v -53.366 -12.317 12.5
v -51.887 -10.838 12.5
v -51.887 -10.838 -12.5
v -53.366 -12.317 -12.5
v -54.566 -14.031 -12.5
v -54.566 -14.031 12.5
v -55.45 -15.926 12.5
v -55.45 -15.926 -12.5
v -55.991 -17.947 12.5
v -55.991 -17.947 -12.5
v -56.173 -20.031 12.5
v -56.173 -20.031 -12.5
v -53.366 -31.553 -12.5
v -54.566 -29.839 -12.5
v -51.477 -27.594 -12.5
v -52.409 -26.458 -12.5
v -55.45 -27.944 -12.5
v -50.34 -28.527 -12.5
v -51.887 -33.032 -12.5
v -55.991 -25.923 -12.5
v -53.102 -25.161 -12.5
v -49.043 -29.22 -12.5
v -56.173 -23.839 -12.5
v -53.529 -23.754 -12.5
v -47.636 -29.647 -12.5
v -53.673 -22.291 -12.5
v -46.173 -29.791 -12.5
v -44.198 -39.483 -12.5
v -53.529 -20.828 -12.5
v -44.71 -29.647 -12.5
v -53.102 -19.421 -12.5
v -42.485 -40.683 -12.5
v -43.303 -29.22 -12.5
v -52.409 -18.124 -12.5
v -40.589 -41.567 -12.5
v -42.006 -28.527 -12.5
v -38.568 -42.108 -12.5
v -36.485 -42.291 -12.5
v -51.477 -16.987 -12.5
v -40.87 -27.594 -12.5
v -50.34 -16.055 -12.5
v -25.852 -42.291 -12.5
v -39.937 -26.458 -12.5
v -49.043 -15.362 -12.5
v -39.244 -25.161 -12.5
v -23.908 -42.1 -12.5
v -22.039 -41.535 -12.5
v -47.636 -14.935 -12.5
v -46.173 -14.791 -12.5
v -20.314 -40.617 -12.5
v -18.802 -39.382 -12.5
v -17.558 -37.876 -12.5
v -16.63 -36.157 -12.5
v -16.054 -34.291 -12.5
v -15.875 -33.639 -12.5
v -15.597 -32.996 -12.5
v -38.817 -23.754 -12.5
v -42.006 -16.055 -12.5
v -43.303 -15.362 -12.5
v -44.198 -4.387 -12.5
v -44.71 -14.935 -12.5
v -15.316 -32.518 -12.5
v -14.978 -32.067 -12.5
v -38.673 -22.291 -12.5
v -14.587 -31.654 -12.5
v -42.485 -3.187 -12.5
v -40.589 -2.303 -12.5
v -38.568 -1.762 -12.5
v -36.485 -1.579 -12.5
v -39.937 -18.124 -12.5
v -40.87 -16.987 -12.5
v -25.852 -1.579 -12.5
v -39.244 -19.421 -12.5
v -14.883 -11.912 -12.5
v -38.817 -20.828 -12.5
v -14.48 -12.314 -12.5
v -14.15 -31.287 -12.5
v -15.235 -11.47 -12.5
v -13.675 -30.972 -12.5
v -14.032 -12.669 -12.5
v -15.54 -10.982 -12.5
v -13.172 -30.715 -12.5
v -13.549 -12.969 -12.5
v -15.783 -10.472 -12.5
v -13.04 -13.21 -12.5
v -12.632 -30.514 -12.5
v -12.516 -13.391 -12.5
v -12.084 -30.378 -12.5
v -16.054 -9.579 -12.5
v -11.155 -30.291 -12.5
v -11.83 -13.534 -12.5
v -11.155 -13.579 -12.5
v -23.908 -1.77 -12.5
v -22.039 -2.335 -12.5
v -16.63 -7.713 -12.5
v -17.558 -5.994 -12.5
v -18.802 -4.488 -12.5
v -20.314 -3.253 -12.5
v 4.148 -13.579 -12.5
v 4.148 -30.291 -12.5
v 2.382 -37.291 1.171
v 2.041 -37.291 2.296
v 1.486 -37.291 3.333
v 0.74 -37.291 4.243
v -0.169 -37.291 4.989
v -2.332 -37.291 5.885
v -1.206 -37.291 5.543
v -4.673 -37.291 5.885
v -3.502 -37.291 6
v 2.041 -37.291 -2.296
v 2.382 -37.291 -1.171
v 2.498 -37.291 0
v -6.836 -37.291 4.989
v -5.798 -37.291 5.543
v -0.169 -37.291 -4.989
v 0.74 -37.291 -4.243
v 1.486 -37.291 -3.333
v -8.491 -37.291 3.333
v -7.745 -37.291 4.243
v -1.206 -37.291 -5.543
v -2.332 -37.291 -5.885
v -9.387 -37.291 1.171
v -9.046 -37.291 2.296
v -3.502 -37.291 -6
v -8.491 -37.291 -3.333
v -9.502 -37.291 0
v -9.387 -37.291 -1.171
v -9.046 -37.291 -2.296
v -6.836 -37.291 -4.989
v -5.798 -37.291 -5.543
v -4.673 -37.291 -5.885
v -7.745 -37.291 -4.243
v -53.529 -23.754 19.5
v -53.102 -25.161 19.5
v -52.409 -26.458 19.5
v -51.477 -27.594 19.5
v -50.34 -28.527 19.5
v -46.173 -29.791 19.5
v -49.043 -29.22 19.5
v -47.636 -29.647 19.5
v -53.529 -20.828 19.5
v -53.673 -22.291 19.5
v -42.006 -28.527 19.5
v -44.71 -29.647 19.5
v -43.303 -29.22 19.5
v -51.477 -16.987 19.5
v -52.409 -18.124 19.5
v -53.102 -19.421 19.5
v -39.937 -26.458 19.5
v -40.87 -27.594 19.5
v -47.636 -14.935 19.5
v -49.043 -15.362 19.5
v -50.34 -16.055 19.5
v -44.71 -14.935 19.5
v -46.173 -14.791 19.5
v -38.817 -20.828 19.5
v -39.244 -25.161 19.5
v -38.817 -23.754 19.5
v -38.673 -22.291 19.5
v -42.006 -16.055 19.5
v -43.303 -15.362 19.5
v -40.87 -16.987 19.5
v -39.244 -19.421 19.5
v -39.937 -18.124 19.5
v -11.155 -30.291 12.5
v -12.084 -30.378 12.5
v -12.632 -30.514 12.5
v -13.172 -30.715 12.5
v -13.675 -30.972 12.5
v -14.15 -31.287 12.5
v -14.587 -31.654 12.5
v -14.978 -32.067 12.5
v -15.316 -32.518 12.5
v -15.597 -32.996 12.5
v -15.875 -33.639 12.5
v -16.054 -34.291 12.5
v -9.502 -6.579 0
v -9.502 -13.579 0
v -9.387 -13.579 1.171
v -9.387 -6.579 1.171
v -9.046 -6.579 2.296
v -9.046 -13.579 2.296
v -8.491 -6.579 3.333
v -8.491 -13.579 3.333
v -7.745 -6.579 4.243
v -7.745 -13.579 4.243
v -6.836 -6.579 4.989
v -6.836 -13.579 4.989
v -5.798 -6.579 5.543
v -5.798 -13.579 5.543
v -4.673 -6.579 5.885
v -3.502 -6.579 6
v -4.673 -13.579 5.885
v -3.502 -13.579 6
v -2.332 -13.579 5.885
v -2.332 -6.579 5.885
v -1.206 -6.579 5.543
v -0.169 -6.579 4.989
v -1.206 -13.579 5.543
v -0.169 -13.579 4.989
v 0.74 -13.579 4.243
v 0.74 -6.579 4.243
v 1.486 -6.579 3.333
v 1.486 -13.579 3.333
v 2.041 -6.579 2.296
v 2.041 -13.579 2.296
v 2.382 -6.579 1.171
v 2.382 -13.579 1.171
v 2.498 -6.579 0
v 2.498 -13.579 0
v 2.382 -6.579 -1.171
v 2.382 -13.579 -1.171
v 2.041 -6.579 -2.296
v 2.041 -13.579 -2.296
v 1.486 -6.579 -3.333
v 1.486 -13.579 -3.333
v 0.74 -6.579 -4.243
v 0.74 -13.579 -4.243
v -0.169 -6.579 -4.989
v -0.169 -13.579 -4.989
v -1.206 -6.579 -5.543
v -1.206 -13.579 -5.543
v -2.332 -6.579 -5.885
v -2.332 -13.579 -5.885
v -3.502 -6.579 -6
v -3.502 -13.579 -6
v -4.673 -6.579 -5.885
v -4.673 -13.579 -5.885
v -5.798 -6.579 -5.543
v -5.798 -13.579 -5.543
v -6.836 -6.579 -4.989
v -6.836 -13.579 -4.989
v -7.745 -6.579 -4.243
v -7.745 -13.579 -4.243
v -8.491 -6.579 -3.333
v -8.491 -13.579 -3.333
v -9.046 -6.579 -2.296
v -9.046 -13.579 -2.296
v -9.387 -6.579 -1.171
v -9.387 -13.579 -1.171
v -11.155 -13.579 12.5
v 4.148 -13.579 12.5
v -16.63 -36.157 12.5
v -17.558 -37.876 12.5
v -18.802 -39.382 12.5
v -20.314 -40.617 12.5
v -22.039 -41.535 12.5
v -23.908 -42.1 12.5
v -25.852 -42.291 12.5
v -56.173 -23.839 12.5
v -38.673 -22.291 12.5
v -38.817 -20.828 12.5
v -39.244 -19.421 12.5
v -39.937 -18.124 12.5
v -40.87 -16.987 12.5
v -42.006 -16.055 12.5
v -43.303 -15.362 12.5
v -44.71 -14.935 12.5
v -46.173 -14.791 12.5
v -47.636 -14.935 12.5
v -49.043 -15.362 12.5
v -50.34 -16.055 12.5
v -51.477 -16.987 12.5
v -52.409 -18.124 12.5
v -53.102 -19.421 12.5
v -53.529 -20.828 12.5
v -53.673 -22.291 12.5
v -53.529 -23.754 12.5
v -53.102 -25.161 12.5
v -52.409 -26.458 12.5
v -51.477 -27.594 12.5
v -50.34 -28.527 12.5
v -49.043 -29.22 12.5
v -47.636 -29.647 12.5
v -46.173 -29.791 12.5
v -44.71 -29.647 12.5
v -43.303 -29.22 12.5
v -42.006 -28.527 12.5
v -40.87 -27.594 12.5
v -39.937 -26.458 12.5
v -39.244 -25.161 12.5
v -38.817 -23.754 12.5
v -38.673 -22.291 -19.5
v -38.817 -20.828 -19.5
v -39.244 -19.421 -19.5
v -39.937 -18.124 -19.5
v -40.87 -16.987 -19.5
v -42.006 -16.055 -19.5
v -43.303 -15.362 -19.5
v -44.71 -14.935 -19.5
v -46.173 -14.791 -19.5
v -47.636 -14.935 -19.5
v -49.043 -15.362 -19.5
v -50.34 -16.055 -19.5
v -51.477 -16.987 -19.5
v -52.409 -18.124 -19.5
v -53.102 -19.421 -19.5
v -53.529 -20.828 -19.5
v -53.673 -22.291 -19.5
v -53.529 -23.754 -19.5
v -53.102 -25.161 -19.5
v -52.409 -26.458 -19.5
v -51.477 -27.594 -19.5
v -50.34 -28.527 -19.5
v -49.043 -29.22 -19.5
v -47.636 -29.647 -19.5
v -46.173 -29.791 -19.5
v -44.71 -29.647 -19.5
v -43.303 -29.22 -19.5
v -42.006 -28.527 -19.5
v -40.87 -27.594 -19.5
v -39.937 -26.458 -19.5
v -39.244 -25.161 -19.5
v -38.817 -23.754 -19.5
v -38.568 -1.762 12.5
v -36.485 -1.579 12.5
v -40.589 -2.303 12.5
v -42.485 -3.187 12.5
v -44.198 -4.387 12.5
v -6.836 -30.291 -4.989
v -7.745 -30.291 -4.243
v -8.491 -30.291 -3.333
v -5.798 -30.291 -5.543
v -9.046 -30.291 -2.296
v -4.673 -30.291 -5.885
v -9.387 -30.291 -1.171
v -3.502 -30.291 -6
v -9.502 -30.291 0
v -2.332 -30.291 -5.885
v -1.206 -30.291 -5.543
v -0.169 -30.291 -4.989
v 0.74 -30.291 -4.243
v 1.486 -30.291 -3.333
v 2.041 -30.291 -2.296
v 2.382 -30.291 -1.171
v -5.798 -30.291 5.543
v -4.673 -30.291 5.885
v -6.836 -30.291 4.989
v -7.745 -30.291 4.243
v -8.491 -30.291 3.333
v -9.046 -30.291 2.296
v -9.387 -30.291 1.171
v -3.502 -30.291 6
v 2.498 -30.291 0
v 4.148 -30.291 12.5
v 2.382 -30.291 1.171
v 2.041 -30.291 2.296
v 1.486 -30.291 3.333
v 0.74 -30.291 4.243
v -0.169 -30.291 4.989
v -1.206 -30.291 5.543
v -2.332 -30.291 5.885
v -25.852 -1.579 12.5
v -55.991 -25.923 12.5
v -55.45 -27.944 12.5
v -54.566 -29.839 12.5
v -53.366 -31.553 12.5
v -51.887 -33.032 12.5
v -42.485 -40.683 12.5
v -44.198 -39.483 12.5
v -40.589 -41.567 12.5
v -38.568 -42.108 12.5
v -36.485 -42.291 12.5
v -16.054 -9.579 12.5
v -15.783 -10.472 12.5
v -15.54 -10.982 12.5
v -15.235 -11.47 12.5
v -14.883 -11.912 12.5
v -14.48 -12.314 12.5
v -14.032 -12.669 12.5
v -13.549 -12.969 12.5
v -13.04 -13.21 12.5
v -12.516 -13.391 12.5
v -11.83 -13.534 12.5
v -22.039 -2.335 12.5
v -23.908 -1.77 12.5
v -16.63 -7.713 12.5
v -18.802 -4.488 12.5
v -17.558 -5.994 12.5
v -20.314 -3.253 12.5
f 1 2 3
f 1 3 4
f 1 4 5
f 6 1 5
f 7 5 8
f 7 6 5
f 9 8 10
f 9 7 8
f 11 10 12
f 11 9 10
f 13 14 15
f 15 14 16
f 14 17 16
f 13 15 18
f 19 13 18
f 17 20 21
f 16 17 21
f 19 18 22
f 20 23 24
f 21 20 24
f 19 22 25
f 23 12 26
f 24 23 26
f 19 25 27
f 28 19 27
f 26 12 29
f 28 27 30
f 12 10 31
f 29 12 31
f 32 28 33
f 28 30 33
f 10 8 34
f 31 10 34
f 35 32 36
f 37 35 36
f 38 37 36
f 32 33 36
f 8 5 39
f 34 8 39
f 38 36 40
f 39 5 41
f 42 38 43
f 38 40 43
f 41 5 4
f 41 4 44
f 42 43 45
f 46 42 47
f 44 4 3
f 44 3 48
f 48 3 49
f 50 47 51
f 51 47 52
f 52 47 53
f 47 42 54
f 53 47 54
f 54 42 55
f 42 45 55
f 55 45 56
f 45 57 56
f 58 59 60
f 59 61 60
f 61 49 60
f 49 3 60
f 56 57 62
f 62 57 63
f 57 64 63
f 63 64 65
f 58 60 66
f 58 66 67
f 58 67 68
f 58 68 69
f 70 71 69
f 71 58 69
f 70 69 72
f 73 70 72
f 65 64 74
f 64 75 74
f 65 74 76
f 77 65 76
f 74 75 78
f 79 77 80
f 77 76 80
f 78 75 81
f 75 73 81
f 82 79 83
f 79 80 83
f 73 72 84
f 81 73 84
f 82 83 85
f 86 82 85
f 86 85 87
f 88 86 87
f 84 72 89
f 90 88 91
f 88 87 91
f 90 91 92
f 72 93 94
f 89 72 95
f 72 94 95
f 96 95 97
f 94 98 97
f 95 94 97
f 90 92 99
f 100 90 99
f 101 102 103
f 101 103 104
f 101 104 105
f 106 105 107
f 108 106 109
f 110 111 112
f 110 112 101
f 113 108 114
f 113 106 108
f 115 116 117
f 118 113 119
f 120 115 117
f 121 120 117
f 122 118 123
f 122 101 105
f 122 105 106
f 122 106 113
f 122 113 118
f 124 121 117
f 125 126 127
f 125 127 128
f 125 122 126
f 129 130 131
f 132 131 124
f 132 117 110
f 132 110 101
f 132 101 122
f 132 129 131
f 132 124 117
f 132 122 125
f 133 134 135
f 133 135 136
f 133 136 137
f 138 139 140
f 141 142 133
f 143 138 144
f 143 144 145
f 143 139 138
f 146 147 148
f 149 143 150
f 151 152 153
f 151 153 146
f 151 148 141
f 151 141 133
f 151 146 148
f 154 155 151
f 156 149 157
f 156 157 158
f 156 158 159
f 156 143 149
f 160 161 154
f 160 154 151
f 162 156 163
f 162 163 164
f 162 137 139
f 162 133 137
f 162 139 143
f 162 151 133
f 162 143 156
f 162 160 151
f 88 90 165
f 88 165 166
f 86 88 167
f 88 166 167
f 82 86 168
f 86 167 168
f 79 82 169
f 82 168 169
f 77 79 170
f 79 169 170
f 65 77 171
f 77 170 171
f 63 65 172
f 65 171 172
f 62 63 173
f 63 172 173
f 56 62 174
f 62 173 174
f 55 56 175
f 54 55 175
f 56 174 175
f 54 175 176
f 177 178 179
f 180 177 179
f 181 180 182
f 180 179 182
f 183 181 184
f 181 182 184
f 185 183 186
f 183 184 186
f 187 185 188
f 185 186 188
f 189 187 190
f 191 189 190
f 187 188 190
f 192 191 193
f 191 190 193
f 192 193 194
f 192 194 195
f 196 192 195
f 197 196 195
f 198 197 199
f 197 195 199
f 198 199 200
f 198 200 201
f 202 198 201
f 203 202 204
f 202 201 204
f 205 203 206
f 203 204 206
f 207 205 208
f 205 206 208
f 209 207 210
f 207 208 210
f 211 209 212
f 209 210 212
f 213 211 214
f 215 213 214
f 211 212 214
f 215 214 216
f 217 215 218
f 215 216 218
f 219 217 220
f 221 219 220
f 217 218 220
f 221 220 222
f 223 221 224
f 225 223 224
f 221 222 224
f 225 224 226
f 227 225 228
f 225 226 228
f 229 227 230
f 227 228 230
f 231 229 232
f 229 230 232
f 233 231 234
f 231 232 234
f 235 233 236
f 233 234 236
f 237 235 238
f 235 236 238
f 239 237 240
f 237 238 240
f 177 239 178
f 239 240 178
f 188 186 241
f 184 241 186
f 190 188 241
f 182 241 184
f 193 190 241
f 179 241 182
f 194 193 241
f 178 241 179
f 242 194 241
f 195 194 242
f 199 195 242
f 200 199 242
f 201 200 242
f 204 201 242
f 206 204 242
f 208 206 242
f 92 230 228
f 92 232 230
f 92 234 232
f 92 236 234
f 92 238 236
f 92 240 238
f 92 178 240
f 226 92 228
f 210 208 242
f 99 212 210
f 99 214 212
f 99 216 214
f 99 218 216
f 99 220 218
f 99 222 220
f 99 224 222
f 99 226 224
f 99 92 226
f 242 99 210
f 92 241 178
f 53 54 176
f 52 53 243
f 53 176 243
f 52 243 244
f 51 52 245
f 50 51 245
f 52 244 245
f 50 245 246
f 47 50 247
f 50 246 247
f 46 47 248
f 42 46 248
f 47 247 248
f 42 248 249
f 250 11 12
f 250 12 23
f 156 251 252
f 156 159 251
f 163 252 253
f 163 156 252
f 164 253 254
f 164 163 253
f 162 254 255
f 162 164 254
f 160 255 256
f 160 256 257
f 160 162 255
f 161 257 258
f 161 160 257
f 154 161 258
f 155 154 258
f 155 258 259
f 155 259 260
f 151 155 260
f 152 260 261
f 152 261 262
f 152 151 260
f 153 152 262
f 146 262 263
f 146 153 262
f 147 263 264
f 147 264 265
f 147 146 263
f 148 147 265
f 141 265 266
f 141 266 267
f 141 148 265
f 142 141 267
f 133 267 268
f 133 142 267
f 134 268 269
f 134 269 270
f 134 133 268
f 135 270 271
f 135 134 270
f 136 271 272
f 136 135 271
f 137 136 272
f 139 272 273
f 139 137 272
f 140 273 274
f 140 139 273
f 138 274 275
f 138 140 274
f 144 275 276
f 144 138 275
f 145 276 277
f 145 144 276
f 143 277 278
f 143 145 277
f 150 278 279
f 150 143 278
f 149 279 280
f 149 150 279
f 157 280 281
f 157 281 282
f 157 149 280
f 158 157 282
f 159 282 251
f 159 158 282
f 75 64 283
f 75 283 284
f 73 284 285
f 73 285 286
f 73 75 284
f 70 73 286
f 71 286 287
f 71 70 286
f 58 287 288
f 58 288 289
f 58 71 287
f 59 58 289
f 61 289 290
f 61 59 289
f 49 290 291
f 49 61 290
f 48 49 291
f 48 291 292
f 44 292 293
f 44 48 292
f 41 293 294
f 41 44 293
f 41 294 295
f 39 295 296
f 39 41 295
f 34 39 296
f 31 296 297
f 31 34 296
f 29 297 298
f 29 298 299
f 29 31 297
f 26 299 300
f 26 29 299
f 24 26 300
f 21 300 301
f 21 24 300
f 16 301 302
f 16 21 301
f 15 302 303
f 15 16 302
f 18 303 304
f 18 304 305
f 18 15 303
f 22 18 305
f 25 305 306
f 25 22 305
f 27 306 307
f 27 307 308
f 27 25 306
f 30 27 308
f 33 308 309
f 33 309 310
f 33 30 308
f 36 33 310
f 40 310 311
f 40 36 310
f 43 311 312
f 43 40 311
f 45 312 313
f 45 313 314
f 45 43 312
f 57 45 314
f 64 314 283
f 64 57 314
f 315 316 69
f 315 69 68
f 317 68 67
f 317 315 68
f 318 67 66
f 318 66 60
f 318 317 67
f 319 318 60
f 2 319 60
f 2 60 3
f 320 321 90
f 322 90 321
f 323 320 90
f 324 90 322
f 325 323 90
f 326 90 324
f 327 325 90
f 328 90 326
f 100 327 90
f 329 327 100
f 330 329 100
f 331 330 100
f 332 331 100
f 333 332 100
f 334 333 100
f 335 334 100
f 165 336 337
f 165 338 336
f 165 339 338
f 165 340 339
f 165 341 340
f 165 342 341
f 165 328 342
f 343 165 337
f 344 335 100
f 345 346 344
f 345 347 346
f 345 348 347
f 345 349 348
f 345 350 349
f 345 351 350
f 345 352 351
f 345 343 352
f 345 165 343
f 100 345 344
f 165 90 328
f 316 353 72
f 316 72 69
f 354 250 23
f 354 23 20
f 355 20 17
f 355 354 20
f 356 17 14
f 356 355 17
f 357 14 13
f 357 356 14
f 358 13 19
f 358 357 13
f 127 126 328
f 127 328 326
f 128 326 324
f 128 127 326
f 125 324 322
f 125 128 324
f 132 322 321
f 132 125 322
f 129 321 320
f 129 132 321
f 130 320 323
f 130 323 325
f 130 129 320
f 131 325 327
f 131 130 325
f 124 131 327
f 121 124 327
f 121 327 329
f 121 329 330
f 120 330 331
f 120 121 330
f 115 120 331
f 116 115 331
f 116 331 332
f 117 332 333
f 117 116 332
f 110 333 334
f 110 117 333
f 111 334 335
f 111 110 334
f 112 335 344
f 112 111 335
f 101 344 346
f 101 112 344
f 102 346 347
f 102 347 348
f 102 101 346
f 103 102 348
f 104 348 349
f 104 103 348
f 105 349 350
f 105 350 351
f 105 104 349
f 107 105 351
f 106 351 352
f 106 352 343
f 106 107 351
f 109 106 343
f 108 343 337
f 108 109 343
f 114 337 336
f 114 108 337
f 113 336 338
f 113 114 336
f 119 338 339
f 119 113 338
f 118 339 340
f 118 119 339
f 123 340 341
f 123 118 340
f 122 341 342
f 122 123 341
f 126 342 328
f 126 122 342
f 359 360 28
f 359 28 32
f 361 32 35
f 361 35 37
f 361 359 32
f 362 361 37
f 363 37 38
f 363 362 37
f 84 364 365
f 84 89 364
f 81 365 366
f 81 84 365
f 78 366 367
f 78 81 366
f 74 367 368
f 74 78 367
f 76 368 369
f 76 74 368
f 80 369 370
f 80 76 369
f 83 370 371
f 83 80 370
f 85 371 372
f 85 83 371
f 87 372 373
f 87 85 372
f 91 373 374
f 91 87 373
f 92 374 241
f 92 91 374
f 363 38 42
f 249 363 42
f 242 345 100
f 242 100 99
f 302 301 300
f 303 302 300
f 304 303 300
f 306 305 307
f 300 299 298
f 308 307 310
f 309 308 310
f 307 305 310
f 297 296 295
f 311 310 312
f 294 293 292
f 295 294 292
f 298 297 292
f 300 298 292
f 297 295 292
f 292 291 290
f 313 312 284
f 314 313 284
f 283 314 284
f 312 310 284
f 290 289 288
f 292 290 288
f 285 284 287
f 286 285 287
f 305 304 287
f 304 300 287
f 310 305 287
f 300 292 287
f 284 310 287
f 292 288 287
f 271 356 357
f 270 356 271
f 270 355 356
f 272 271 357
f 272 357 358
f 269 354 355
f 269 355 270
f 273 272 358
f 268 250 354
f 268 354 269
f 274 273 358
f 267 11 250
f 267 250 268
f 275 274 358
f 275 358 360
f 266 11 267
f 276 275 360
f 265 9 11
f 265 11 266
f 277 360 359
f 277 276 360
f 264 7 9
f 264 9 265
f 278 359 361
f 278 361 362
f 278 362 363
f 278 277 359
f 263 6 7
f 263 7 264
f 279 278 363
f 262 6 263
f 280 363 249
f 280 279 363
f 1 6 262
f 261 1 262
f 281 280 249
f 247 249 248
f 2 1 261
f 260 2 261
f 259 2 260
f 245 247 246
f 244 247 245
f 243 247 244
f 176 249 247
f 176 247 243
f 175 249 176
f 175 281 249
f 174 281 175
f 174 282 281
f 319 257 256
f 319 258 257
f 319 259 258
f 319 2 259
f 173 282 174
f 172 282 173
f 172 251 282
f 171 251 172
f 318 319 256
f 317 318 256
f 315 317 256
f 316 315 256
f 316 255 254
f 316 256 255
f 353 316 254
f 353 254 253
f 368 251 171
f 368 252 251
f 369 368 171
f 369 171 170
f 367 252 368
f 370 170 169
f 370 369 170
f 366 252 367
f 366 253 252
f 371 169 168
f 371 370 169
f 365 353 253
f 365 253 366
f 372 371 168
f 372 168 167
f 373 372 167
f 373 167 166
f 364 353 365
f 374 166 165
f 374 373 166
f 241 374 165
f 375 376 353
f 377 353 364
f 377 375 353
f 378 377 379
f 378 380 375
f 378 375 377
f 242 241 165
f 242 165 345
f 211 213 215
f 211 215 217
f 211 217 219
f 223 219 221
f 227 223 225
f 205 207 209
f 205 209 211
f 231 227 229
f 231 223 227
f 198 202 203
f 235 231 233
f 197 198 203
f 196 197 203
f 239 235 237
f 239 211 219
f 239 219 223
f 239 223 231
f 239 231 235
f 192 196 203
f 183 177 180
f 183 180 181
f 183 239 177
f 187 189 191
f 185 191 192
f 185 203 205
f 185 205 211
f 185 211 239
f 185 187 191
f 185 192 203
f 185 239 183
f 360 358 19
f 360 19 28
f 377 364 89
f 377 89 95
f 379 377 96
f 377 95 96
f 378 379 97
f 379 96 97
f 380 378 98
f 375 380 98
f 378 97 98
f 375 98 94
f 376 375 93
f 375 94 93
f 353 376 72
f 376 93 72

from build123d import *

# Parameters (mm, degrees)
SALIENTE_EXTRUIR1_DEPTH = 12.5
CROQUIS3_R              = 7.5
SALIENTE_EXTRUIR2_DEPTH = 19.5
CROQUIS4_W              = 20
CROQUIS4_H              = 25
CORTAR_EXTRUIR1_DEPTH   = 12
CROQUIS5_W              = 20
CROQUIS5_H              = 25
CORTAR_EXTRUIR2_DEPTH   = 12
REDONDEO1_R             = 10
REDONDEO2_R             = 5
CROQUIS7_R              = 6
SALIENTE_EXTRUIR4_DEPTH = 7
SALIENTE_EXTRUIR5_START = 7
CROQUIS8_R              = 6
SALIENTE_EXTRUIR5_DEPTH = 7


with BuildPart() as part:
    # Croquis1 → Saliente-Extruir1 (new, symmetric)
    with BuildSketch(Plane.XY):
        with BuildLine():
            Line((4.147680169, -1.57927741), (-36.48467702, -1.57927741))
            ThreePointArc((-36.48467702, -1.57927741), (-40.58891874, -2.30296596), (-44.198128336, -4.386744092))
            Line((-44.198128336, -4.386744092), (-51.88666001, -10.838188184))
            ThreePointArc((-51.88666001, -10.838188184), (-55.048902138, -14.95930236), (-56.173208693, -20.030721501))
            Line((-56.173208693, -20.030721501), (-56.173208693, -23.839337705))
            ThreePointArc((-56.173208693, -23.839337705), (-55.048902138, -28.910756846), (-51.88666001, -33.031871023))
            Line((-51.88666001, -33.031871023), (-44.198128336, -39.483315114))
            ThreePointArc((-44.198128336, -39.483315114), (-40.58891874, -41.567093246), (-36.48467702, -42.290781797))
            Line((-36.48467702, -42.290781797), (4.147680169, -42.290781797))
            Line((4.147680169, -42.290781797), (4.147680169, -1.57927741))
        make_face()
    extrude(amount=SALIENTE_EXTRUIR1_DEPTH, both=True)

    # Croquis3 → Saliente-Extruir2 (add, symmetric)
    with BuildSketch(Plane.XY):
        with Locations((-46.173208693, -22.290781797)):
            Circle(CROQUIS3_R)
    extrude(amount=SALIENTE_EXTRUIR2_DEPTH, both=True)

    # Croquis4 → Cortar-Extruir1 (cut)
    with BuildSketch(Plane(origin=(0, -1.57927741, 0), x_dir=(1, 0, 0), z_dir=(0, 1, 0))):
        with Locations((-5.852319831, 0)):
            Rectangle(CROQUIS4_W, CROQUIS4_H)
    extrude(amount=-CORTAR_EXTRUIR1_DEPTH, mode=Mode.SUBTRACT)

    # Croquis5 → Cortar-Extruir2 (cut)
    with BuildSketch(Plane.XZ.offset(42.290781797)):
        with Locations((-5.852319831, 0)):
            Rectangle(CROQUIS5_W, CROQUIS5_H)
    extrude(amount=-CORTAR_EXTRUIR2_DEPTH, mode=Mode.SUBTRACT)

    # Redondeo1
    redondeo1_edges = [part.edges().sort_by_distance(p)[0] for p in [
        (-15.852319831, -1.57927741, 0),
        (-15.852319831, -42.290781797, 0),
    ]]
    fillet(redondeo1_edges, radius=REDONDEO1_R)

    # Redondeo2
    redondeo2_edges = [part.edges().sort_by_distance(p)[0] for p in [
        (-15.852319831, -13.57927741, 0),
        (-15.852319831, -30.290781797, 0),
    ]]
    fillet(redondeo2_edges, radius=REDONDEO2_R)

    # Croquis7 → Saliente-Extruir4 (add)
    with BuildSketch(Plane(origin=(0, -13.57927741, 0), x_dir=(1, 0, 0), z_dir=(0, 1, 0))):
        with Locations(Location((-3.502319831, 0, 0), (0, 0, 180))):
            Circle(CROQUIS7_R)
    extrude(amount=SALIENTE_EXTRUIR4_DEPTH)

    # Croquis8 → Saliente-Extruir5 (add)
    with BuildSketch(Plane.XZ.offset(30.290781797).offset(SALIENTE_EXTRUIR5_START)):
        with Locations(Location((-3.502319831, 0, 0), (0, 0, 180))):
            Circle(CROQUIS8_R)
    extrude(amount=-SALIENTE_EXTRUIR5_DEPTH)


solid = part.part
